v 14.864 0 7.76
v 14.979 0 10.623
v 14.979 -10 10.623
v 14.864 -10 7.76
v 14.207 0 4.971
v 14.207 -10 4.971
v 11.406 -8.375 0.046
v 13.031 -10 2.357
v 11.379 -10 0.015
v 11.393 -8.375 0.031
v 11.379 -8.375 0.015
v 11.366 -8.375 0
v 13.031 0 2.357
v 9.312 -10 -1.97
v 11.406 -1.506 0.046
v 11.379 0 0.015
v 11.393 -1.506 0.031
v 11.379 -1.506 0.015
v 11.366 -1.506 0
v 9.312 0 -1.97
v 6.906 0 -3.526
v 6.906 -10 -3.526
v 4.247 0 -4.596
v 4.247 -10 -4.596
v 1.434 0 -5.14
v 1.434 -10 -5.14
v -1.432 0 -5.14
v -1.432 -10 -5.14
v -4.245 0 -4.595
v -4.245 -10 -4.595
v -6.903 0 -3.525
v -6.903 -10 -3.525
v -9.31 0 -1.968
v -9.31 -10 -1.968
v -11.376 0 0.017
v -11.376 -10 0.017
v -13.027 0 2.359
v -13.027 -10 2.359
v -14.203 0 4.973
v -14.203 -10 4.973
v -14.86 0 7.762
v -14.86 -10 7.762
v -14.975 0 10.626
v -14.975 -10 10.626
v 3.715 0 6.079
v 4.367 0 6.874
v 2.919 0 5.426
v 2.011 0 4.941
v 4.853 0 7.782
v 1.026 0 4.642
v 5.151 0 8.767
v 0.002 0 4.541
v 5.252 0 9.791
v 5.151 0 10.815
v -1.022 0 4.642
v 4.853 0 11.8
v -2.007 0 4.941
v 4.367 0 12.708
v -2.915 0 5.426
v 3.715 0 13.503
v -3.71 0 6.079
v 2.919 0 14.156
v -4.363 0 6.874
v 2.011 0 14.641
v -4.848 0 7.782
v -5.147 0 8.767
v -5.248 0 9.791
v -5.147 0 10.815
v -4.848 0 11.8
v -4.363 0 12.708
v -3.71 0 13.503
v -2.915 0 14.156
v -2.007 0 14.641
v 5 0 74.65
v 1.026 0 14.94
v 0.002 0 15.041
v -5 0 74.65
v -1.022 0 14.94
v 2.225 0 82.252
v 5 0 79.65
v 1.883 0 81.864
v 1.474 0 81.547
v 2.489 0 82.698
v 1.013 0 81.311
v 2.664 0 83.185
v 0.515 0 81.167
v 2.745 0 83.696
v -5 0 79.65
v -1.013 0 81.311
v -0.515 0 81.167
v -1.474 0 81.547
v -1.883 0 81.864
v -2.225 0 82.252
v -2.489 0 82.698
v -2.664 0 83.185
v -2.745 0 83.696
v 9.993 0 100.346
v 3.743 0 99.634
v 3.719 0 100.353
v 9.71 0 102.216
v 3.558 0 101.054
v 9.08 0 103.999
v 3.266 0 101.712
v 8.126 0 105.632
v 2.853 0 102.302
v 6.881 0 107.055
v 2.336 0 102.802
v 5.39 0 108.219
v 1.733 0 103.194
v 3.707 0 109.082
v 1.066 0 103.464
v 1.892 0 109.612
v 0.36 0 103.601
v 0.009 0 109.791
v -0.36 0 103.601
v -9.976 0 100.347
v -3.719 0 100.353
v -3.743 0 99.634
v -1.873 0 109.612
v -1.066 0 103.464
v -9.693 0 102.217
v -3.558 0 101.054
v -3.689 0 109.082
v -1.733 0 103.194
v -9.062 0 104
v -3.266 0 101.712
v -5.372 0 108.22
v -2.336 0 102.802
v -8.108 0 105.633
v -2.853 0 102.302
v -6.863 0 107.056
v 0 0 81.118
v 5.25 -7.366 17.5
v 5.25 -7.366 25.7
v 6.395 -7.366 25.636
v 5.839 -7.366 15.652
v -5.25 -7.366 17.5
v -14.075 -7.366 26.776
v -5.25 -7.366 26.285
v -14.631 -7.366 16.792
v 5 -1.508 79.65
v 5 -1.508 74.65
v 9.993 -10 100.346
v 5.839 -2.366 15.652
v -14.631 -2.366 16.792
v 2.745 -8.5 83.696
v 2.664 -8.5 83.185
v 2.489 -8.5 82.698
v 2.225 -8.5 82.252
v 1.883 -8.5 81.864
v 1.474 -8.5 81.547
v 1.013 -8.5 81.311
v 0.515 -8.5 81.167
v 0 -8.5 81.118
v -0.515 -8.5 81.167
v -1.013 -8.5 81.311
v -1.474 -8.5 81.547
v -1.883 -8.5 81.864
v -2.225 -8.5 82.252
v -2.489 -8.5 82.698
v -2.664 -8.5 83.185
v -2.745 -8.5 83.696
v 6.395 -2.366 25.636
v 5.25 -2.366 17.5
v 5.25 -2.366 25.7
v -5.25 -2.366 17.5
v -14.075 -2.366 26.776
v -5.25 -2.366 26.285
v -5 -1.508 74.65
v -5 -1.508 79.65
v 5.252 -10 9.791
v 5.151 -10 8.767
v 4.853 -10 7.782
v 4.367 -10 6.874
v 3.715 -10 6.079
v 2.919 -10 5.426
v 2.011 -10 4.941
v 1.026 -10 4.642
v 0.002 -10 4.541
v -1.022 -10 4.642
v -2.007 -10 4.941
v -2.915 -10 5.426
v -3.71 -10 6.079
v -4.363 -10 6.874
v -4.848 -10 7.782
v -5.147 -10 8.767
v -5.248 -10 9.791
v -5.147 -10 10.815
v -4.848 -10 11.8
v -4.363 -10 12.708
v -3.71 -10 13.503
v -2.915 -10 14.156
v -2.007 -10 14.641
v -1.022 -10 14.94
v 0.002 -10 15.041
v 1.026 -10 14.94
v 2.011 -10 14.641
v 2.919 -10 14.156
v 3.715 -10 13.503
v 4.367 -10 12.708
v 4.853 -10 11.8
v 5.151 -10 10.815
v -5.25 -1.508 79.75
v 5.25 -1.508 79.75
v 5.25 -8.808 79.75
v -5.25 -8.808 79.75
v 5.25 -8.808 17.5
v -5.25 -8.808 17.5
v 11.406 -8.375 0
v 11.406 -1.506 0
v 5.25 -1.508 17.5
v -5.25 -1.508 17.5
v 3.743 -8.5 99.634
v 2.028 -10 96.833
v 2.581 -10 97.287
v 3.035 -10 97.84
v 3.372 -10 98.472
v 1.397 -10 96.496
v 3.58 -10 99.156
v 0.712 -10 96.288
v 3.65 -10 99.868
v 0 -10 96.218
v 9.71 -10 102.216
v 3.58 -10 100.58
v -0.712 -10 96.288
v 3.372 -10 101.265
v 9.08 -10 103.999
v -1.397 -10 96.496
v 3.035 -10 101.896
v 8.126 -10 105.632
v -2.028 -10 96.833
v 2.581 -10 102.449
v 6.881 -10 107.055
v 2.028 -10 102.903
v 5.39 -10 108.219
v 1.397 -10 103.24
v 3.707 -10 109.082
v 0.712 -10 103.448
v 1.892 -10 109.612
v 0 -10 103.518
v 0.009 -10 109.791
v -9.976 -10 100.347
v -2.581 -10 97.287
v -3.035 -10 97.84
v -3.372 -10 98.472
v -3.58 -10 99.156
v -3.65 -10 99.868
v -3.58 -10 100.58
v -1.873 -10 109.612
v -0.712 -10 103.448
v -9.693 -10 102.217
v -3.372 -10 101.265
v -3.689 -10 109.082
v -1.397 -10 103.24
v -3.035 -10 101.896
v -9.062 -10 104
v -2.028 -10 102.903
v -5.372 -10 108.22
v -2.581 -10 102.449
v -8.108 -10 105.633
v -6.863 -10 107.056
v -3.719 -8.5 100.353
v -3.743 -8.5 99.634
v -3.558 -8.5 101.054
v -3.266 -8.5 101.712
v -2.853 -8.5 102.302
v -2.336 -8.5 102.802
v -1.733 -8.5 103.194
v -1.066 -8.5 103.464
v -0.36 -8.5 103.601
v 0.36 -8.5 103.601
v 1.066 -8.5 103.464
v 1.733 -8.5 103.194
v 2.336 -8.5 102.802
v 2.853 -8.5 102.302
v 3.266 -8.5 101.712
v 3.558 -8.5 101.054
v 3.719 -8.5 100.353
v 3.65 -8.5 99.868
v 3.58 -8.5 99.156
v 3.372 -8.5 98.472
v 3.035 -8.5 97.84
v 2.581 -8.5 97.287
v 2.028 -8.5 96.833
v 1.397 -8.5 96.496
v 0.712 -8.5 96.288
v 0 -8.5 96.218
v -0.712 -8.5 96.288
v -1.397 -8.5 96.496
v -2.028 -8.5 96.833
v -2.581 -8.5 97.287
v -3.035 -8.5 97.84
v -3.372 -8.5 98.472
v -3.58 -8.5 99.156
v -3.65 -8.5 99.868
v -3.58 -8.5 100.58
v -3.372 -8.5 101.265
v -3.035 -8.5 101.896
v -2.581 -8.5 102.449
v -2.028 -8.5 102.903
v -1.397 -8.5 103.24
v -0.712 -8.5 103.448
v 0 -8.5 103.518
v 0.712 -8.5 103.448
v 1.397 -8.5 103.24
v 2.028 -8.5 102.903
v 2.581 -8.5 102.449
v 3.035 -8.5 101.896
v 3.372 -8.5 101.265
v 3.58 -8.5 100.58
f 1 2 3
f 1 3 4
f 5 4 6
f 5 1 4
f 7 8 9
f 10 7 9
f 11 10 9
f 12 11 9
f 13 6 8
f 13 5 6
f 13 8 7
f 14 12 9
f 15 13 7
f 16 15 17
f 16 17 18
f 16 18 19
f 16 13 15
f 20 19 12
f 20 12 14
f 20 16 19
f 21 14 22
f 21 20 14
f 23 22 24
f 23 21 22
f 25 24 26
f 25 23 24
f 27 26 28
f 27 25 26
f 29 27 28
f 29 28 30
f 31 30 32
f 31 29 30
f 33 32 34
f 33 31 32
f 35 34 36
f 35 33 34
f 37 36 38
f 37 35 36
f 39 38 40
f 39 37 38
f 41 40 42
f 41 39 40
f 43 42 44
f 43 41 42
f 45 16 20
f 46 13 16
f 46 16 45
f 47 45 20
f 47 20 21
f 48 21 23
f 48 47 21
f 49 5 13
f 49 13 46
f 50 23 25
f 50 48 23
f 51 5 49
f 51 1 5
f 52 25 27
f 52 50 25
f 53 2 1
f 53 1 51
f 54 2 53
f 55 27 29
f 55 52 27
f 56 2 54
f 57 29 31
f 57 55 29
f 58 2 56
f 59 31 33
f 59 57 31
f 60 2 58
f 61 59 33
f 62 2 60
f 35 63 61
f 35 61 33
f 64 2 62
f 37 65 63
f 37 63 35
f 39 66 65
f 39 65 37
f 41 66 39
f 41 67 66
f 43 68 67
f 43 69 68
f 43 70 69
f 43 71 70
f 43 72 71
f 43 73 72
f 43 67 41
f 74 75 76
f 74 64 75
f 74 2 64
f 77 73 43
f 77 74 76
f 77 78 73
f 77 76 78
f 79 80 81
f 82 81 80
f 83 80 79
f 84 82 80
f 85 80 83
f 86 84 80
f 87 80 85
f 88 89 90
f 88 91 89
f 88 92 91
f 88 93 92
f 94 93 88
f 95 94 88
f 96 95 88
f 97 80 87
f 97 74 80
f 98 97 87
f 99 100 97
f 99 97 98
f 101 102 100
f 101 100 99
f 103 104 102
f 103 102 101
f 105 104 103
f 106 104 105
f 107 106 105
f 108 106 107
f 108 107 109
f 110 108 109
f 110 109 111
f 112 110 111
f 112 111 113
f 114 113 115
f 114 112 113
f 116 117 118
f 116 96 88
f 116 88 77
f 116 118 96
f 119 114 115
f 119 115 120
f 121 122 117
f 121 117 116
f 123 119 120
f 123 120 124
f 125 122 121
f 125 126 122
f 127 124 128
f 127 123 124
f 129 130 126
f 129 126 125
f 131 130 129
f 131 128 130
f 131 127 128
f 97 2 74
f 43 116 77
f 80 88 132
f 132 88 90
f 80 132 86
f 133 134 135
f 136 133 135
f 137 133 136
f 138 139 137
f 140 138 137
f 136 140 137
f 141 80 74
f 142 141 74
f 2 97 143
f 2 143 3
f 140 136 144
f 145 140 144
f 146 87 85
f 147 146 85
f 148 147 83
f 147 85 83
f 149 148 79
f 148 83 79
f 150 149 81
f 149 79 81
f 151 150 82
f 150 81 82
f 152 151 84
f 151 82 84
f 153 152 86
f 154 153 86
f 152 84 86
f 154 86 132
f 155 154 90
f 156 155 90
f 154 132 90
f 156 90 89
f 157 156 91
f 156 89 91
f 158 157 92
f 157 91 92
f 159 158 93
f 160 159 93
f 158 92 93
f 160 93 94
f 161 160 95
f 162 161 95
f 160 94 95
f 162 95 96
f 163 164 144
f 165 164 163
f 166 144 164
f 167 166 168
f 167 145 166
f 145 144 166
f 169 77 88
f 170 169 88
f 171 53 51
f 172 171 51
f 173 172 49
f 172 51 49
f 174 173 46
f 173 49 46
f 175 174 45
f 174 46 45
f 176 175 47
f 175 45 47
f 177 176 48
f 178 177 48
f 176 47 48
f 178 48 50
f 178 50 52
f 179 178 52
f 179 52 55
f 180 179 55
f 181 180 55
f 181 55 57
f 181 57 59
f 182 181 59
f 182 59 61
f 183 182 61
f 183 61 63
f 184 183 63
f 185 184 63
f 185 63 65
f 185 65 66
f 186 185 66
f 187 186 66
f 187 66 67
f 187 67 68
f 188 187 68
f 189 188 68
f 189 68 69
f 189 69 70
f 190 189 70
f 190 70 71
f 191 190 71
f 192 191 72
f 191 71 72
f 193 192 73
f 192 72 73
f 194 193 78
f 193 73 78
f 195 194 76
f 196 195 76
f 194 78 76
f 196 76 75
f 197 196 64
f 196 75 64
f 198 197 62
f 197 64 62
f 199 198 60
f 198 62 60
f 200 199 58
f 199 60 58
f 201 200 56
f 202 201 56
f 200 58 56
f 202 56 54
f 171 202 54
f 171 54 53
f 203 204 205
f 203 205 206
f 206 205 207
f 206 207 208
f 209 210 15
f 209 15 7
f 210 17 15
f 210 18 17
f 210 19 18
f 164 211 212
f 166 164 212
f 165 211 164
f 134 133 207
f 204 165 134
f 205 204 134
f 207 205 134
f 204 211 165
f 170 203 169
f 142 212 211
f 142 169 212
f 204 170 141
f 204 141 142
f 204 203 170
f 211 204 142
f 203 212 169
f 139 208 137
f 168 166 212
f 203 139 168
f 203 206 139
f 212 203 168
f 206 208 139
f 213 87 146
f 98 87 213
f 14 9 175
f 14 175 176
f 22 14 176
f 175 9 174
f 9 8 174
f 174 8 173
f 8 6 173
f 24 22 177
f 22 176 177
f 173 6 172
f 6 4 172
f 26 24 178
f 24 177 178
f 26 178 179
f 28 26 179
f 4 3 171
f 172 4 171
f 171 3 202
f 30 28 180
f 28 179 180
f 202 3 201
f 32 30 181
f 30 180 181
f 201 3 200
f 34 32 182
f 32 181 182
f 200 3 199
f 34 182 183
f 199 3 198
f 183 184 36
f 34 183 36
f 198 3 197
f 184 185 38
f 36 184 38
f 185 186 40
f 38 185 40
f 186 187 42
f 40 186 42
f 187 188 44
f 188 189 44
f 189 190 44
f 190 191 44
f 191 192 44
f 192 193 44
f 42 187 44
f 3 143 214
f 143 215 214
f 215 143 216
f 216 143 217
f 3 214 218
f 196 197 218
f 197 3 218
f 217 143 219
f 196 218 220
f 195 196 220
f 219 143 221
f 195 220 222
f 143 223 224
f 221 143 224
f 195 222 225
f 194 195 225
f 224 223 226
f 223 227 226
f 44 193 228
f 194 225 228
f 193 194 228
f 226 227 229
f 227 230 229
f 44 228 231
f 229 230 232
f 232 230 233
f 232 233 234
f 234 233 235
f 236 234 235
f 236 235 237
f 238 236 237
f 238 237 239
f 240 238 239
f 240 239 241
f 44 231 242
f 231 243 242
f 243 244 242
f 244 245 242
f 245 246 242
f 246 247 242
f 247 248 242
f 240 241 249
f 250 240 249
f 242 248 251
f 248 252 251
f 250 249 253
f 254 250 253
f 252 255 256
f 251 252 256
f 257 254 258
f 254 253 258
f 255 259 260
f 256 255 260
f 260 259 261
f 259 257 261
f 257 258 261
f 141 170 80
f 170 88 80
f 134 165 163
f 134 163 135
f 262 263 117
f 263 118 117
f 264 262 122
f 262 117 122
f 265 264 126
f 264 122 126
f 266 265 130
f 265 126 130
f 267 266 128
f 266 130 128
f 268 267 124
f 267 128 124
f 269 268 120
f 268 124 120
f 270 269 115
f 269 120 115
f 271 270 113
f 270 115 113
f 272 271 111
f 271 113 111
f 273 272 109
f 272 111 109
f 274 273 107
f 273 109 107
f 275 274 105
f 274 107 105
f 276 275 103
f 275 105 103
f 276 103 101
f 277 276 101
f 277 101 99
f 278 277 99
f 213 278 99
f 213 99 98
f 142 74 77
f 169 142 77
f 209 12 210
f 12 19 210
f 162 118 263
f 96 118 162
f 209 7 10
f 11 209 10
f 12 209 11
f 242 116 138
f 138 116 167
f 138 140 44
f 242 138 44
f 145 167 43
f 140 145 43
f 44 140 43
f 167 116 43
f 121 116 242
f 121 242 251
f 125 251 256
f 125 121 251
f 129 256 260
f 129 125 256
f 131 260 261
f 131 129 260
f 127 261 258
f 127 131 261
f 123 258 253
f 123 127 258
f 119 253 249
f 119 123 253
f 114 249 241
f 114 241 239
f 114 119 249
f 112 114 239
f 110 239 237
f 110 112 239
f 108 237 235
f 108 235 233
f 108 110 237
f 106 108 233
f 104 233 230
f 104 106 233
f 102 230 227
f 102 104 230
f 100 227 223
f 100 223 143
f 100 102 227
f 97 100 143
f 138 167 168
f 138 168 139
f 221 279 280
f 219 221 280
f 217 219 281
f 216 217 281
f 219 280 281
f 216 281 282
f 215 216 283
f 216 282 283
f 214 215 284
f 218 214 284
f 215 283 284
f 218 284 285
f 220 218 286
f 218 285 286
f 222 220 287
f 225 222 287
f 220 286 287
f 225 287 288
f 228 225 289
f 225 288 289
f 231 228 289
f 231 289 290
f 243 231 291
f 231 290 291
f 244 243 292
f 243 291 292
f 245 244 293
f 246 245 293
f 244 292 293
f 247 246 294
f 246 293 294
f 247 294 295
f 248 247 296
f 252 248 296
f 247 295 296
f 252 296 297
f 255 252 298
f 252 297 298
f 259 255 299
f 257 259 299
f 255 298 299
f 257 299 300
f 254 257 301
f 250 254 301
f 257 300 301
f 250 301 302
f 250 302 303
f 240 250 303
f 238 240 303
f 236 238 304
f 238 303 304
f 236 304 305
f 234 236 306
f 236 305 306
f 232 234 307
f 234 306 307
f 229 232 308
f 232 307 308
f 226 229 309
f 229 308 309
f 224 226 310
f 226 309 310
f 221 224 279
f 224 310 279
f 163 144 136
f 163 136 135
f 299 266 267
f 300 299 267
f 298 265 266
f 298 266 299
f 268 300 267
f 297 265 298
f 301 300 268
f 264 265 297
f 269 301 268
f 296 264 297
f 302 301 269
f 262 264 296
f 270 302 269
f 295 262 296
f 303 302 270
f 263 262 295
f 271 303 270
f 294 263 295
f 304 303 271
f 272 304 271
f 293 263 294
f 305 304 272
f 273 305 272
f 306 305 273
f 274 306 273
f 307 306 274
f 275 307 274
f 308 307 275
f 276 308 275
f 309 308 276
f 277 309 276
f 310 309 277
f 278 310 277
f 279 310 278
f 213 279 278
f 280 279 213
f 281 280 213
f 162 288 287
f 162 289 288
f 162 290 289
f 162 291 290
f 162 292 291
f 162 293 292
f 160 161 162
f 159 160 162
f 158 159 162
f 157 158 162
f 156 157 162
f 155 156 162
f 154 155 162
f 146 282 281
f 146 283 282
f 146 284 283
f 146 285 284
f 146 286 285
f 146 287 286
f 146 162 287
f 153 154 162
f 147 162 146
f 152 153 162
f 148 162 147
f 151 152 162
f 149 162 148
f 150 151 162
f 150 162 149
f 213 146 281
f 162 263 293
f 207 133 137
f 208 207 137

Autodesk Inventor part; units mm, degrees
ref_plane "YZ Plane" through (0, 0, 0) normal (1, 0, 0) x (0, 1, 0)
ref_plane "XZ Plane" through (0, 0, 0) normal (0, 1, 0) x (-1, 0, 0)
sketch "Sketch1" plane through (0, 0, 0) normal (0, 1, 0) x (-1, 0, 0)
  circle A0 centre (-0.0087, 99.7911) radius 10
  circle A1 centre (-0.0022, 9.7911) radius 15
  line L0 (9.9759, 100.3474) -> (14.9746, 10.6255)
  line L1 (-9.9933, 100.346) -> (-14.9791, 10.6234)
  point P0 (0, 0)
  dimension "d0" = 20
  dimension "d1" = 30
  dimension "d2" = 90
extrude "Extrusion1" add sketch "Sketch1" against normal blind 10
sketch "Sketch2" plane through (0, 0, 0) normal (0, 1, 0) x (1, 0, 0)
  circle A0 centre (0, -99.8683) radius 3.75
  circle A1 centre (0, -83.8683) radius 2.75
  line L0 (2.7446, -83.6964) -> (3.7427, -99.6339)
  line L1 (-3.7427, -99.6339) -> (-2.7446, -83.6964)
  point P0 (0, 0)
  dimension "d7" = 7.5
  dimension "d8" = 5.5
  dimension "d9" = 16
extrude "Extrusion2" cut sketch "Sketch2" against normal blind 8.5
sketch "Sketch3" plane through (0, -8.5, 0) normal (0, 1, 0) x (1, 0, 0)
  arc A0 (-3.7427, -99.6339) -> (3.7427, -99.6339) centre (0, -99.8683) ccw projected
  circle A1 centre (0, -99.8683) radius 3.65
  point P0 (0, 0)
  dimension "d12" = 7.3
extrude "Extrusion3" cut sketch "Sketch3" against normal blind 8.5
sketch "Sketch4" plane through (0, 0, 0) normal (0, 1, 0) x (1, 0, 0)
  arc A0 (14.9791, -10.6234) -> (-14.9746, -10.6255) centre (0.0022, -9.7911) ccw projected
  circle A1 centre (0.0022, -9.7911) radius 5.25
  point P0 (0, 0)
  dimension "d15" = 10.5
extrude "Extrusion4" cut sketch "Sketch4" against normal blind 11
sketch "Sketch6" plane through (0, 0, 0) normal (0, 0, 1) x (1, 0, 0)
  line L0 (-10.7414, -1.5061) -> (11.4058, -1.5061)
  line L1 (11.4058, -1.5061) -> (11.4058, -8.375)
  line L2 (11.4058, -8.375) -> (-10.7414, -8.375)
  line L3 (-10.7414, -8.375) -> (-10.7414, -1.5061)
  point P0 (0, 0)
extrude "Extrusion6" add sketch "Sketch6" along normal blind 1
ref_plane "Work Plane3" through (0, 0, 79.75) normal (0, 0, -1) x (-1, 0, 0)
sketch "Sketch7" plane through (0, 0, 79.75) normal (0, 0, -1) x (-1, 0, 0)
  line L0 (5.25, -1.5083) -> (-5.25, -1.5083)
  line L1 (-5.25, -1.5083) -> (-5.25, -8.8083)
  line L2 (-5.25, -8.8083) -> (5.25, -8.8083)
  line L3 (5.25, -8.8083) -> (5.25, -1.5083)
  line L4 (5.25, -1.5083) -> (-5.25, -8.8083) construction
  line L5 (-5.25, -1.5083) -> (5.25, -8.8083) construction
  point P0 (0, 0)
  point P1 (0, -5.1583)
  dimension "d23" = 10.5
  dimension "d24" = 7.3
extrude "Extrusion7" cut sketch "Sketch7" along normal blind 62.25
sketch "Sketch8" plane through (0, 0, 0) normal (0, 1, 0) x (1, 0, 0)
  line L0 (-5, -79.6503) -> (5, -79.6503)
  line L1 (5, -79.6503) -> (5, -74.6503)
  line L2 (5, -74.6503) -> (-5, -74.6503)
  line L3 (-5, -74.6503) -> (-5, -79.6503)
  line L4 (-5, -79.6503) -> (5, -74.6503) construction
  line L5 (5, -79.6503) -> (-5, -74.6503) construction
  point P0 (0, 0)
  point P1 (0, -77.1503)
  dimension "d27" = 10
  dimension "d28" = 5
extrude "Extrusion8" cut sketch "Sketch8" against normal blind 8.5
sketch "Sketch9" plane through (-14.9746, -10, 10.6255) normal (-0.9985, 0, 0.0556) x (0.0556, 0, 0.9985)
  line L0 (16.1756, 2.6337) -> (6.1756, 2.6337)
  line L1 (6.1756, 2.6337) -> (6.1756, 7.6337)
  line L2 (6.1756, 7.6337) -> (16.1756, 7.6337)
  line L3 (16.1756, 7.6337) -> (16.1756, 2.6337)
  line L4 (16.1756, 2.6337) -> (6.1756, 7.6337) construction
  line L5 (6.1756, 2.6337) -> (16.1756, 7.6337) construction
  point P0 (-9.7761, 10)
  point P1 (11.1756, 5.1337)
  dimension "d31" = 10
  dimension "d32" = 5
extrude "Extrusion9" cut sketch "Sketch9" against normal blind 20.5
properties part number "Brazo_3DPrint"
